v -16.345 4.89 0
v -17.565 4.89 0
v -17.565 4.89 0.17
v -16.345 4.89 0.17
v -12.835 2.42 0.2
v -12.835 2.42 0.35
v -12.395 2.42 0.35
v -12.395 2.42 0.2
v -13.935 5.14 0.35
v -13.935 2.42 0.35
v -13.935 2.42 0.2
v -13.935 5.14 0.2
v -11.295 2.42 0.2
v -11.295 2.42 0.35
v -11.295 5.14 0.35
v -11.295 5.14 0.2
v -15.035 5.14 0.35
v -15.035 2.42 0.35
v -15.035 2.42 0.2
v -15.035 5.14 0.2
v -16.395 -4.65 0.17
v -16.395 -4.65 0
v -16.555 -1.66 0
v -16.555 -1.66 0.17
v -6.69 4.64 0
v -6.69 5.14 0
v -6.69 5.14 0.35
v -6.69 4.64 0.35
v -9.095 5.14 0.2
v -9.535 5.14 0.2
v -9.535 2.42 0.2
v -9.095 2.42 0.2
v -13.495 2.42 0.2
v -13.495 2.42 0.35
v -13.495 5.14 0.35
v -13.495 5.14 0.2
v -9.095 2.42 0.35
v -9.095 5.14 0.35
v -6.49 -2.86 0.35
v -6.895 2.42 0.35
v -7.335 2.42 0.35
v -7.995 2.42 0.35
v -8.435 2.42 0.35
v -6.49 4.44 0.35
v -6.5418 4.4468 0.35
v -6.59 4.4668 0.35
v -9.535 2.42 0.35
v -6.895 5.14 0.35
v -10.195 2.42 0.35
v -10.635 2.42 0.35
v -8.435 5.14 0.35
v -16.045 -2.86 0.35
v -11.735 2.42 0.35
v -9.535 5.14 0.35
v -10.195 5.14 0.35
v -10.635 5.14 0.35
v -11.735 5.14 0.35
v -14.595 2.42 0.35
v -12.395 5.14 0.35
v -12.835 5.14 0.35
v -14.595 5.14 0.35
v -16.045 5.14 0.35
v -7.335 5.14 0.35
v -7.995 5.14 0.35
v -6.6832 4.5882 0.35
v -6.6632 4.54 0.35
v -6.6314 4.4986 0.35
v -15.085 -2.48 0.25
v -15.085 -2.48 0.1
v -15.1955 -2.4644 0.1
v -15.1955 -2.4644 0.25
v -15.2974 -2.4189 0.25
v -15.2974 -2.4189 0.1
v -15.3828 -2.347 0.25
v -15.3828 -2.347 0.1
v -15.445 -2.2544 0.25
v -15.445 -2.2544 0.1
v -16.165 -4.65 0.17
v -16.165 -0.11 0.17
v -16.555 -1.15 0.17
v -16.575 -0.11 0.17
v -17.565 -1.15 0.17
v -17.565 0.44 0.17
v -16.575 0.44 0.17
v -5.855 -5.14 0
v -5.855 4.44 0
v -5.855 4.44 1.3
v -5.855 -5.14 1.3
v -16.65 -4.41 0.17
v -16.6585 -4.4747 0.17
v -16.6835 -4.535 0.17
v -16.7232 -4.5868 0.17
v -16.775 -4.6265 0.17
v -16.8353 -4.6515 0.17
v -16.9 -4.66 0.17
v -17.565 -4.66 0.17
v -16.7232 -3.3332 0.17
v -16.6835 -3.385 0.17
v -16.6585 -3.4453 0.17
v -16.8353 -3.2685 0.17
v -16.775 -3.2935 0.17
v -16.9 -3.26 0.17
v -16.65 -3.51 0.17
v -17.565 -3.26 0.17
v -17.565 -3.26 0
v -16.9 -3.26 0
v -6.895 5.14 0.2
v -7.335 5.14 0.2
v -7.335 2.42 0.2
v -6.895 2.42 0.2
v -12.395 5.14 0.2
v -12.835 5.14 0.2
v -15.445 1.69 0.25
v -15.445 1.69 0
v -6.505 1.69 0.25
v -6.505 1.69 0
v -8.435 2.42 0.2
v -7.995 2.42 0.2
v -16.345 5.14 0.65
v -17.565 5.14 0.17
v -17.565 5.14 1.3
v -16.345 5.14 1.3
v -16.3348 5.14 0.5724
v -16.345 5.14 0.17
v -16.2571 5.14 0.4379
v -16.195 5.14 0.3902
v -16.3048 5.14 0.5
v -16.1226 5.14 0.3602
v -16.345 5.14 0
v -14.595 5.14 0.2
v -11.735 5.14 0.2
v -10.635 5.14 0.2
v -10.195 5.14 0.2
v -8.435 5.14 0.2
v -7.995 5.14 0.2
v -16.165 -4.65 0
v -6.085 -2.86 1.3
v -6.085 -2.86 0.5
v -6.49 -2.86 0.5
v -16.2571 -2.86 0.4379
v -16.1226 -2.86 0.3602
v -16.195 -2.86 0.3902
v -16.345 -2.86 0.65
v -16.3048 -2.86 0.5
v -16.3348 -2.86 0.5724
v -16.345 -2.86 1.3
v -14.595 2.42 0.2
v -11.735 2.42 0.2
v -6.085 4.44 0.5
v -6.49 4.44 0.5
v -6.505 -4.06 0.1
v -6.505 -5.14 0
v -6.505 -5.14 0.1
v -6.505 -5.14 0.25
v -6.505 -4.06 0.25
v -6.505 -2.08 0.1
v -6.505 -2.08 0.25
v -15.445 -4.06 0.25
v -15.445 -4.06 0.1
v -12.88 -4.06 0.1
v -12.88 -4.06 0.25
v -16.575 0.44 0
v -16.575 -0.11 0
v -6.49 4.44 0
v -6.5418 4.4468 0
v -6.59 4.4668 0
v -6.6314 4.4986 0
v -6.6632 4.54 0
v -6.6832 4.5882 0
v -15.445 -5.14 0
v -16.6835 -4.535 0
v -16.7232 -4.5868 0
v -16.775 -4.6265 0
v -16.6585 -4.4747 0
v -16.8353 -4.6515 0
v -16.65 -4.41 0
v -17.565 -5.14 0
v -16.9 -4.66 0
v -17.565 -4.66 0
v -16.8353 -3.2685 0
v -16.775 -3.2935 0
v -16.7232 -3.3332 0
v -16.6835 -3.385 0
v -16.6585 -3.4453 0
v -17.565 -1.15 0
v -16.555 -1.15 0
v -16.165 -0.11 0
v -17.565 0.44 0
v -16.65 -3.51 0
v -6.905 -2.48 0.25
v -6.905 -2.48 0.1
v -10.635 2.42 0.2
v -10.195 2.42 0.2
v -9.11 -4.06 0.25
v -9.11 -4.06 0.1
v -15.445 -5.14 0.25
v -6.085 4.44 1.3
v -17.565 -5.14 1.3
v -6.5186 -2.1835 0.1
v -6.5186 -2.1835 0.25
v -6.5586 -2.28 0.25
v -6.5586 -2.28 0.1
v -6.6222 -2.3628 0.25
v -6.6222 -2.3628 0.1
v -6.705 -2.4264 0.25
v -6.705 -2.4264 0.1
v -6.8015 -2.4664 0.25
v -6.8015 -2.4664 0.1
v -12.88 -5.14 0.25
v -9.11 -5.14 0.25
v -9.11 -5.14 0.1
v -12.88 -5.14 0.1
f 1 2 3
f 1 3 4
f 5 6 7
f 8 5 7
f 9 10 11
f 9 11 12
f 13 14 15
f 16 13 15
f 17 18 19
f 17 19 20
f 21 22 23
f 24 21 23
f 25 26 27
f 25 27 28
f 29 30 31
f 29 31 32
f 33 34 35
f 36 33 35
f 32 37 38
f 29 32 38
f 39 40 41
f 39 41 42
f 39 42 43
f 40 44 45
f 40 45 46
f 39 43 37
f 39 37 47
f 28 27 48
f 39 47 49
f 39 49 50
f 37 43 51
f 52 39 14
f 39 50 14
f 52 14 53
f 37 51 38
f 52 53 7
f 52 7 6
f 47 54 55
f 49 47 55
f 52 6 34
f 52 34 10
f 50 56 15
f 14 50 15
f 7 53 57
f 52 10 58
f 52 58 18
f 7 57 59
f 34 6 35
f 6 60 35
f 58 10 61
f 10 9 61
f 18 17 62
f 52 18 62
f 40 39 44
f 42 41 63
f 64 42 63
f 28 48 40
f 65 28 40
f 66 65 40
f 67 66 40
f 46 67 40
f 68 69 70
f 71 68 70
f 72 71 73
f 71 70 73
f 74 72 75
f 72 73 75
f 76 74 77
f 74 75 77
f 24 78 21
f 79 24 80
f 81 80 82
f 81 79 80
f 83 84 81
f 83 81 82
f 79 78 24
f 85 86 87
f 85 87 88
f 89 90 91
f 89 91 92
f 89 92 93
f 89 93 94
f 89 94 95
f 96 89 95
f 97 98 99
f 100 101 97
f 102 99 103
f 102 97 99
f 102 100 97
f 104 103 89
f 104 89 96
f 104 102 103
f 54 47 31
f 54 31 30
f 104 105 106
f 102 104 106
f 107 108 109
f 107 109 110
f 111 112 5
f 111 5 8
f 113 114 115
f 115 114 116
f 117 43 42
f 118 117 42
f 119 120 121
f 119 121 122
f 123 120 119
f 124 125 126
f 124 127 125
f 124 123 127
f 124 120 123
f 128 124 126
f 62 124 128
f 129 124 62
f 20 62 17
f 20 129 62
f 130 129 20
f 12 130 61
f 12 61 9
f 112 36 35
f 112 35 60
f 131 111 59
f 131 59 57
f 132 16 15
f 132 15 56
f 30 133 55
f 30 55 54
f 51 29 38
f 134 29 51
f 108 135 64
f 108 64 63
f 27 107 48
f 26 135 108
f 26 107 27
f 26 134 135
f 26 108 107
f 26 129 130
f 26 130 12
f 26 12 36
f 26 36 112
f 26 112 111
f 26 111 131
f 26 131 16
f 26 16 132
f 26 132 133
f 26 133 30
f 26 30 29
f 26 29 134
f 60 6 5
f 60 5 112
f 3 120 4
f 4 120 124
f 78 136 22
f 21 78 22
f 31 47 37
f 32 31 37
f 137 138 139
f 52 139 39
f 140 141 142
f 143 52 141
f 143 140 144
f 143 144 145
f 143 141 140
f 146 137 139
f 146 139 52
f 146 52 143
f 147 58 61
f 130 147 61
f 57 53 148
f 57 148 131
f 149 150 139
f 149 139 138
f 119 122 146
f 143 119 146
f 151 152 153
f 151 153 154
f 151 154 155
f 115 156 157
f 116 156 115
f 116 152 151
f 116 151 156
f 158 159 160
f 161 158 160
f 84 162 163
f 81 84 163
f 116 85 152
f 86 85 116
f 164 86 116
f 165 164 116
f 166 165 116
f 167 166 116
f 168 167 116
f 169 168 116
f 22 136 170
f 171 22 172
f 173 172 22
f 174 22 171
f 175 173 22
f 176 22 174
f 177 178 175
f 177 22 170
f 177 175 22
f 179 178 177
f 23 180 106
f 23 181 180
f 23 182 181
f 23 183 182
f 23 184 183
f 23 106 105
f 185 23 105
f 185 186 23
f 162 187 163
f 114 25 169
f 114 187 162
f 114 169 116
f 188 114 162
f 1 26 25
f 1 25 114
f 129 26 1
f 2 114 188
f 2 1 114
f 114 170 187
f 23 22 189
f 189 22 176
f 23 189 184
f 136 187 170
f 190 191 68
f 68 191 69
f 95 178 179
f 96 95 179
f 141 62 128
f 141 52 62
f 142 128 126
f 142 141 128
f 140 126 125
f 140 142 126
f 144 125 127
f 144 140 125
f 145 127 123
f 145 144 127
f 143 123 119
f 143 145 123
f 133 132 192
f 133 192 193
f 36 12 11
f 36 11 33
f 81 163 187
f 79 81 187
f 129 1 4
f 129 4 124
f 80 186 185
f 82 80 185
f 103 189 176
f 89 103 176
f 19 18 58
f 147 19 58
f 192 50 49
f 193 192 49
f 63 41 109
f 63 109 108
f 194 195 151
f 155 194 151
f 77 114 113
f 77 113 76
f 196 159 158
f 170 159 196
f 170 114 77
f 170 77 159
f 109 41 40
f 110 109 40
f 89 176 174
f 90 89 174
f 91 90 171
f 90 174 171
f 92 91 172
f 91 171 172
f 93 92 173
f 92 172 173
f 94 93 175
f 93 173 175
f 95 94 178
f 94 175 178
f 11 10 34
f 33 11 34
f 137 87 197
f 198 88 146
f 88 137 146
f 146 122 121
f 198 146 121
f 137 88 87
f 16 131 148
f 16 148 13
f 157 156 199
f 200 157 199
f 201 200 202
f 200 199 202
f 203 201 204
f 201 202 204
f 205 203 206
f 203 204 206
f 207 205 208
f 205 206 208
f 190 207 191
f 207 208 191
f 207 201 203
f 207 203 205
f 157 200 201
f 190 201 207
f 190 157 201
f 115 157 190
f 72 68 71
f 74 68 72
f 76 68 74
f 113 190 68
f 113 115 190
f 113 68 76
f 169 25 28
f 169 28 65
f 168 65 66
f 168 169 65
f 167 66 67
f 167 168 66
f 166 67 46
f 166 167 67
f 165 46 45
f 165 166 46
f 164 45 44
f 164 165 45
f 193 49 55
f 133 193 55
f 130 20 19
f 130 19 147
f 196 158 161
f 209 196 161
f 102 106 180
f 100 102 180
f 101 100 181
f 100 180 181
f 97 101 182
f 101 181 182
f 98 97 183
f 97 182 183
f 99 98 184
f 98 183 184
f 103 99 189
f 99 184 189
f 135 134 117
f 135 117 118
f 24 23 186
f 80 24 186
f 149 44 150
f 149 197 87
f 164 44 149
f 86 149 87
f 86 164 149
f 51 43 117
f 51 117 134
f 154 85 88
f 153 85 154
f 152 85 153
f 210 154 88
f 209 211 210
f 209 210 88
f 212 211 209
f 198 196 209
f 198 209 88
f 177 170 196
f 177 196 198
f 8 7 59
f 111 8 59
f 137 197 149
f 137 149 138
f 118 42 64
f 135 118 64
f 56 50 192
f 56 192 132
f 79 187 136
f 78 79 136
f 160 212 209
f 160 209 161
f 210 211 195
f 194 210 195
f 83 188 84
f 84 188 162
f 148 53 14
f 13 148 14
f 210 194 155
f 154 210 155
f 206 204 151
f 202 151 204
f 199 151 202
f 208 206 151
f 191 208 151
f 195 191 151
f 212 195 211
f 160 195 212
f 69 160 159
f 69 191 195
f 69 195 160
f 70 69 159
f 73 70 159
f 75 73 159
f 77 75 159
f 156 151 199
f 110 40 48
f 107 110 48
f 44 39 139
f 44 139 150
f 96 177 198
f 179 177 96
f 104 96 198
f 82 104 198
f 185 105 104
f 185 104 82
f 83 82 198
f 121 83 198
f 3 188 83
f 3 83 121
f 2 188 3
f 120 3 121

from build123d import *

# Parameters (mm, degrees)
BOSS_EXTRUDE1_DEPTH = 1.3
SKETCH3_W           = 1.22
SKETCH3_H           = 0.25
CUT_EXTRUDE1_DEPTH  = 0.17
CUT_EXTRUDE2_DEPTH  = 0.17
CUT_EXTRUDE3_DEPTH  = 0.1
SKETCH6_W           = 2.565
SKETCH6_H           = 1.079999998
SKETCH6_W_2         = 2.605000011
SKETCH6_H_2         = 1.079999997
CUT_EXTRUDE4_DEPTH  = 0.15
CUT_EXTRUDE5_DEPTH  = 0.95
SKETCH8_W           = 0.405
SKETCH8_H           = 7.3
BOSS_EXTRUDE2_DEPTH = 0.15
FILLET1_R           = 0.3
SKETCH9_W           = 0.44
SKETCH9_H           = 2.72
CUT_EXTRUDE6_DEPTH  = 0.15
LPATTERN1_COUNT     = 8
LPATTERN1_PITCH     = 1.1


with BuildPart() as part:
    # Sketch2 → Boss-Extrude1 (new body)
    with BuildSketch(Plane.XY):
        with BuildLine():
            Line((5.855, 5.140000001), (4.635, 5.140000001))
            Line((4.635, 5.140000001), (-5.02, 5.140000001))
            Line((-5.02, 5.140000001), (-5.02, 4.640000001))
            ThreePointArc((-5.02, 4.640000001), (-5.078578644, 4.498578644), (-5.22, 4.440000001))
            Line((-5.22, 4.440000001), (-5.855, 4.440000001))
            Line((-5.855, 4.440000001), (-5.855, -5.139999999))
            Line((-5.855, -5.139999999), (-5.205000011, -5.139999999))
            Line((-5.205000011, -5.139999999), (-2.6, -5.139999999))
            Line((-2.6, -5.139999999), (1.17, -5.139999999))
            Line((1.17, -5.139999999), (3.735, -5.139999999))
            Line((3.735, -5.139999999), (5.855, -5.139999999))
            Line((5.855, -5.139999999), (5.855, -4.659999975))
            Line((5.855, -4.659999975), (5.855, -3.259999975))
            Line((5.855, -3.259999975), (5.855, -1.150000033))
            Line((5.855, -1.150000033), (5.855, 0.439999967))
            Line((5.855, 0.439999967), (5.855, 4.890000001))
            Line((5.855, 4.890000001), (5.855, 5.140000001))
        make_face()
    extrude(amount=BOSS_EXTRUDE1_DEPTH)

    # Sketch3 → Cut-Extrude1 (cut)
    with BuildSketch(Plane(origin=(0, 0, 0), x_dir=(-1, 0, 0), z_dir=(0, 0, -1))):
        with Locations((-5.245, 5.015000001)):
            Rectangle(SKETCH3_W, SKETCH3_H)
    extrude(amount=-CUT_EXTRUDE1_DEPTH, mode=Mode.SUBTRACT)

    # Sketch4 → Cut-Extrude2 (cut)
    with BuildSketch(Plane(origin=(0, 0, 0), x_dir=(-1, 0, 0), z_dir=(0, 0, -1))):
        with BuildLine():
            Line((-5.855, -3.259999975), (-5.190000002, -3.259999975))
            ThreePointArc((-5.190000002, -3.259999975), (-5.013223307, -3.333223279), (-4.940000002, -3.509999975))
            Line((-4.940000002, -3.509999975), (-4.940000002, -4.409999975))
            ThreePointArc((-4.940000002, -4.409999975), (-5.013223307, -4.58677667), (-5.190000002, -4.659999975))
            Line((-5.190000002, -4.659999975), (-5.855, -4.659999975))
            Line((-5.855, -4.659999975), (-5.855, -3.259999975))
        make_face()
        Polygon((-4.455, -4.649999999), (-4.685, -4.649999999), (-4.845000002, -1.660000037), (-4.845000002, -1.150000033), (-5.855, -1.150000033), (-5.855, 0.439999967), (-4.865000002, 0.439999967), (-4.865000002, -0.110000037), (-4.455, -0.110000037), align=None)
    extrude(amount=-CUT_EXTRUDE2_DEPTH, mode=Mode.SUBTRACT)

    # Sketch5 → Cut-Extrude3 (cut)
    with BuildSketch(Plane(origin=(0, 0, 0), x_dir=(-1, 0, 0), z_dir=(0, 0, -1))):
        Polygon((5.205000011, -5.139999999), (2.6, -5.139999999), (-1.17, -5.139999999), (-3.735, -5.139999999), (-3.735, -4.060000001), (-3.735, -2.254355959), (-3.735, 1.690000007), (5.205000011, 1.690000007), (5.205000011, -2.080000002), (5.205000011, -4.060000002), align=None)
    extrude(amount=-CUT_EXTRUDE3_DEPTH, mode=Mode.SUBTRACT)

    # Sketch6 → Cut-Extrude4 (cut)
    with BuildSketch(Plane(origin=(0, 0, 0.1), x_dir=(-1, 0, 0), z_dir=(0, 0, -1))):
        with Locations((-2.4525, -4.6)):
            Rectangle(SKETCH6_W, SKETCH6_H)
        with Locations((3.902500006, -4.600000001)):
            Rectangle(SKETCH6_W_2, SKETCH6_H_2)
        with BuildLine():
            Line((5.205000011, 1.690000007), (5.205000011, -2.080000002))
            ThreePointArc((5.205000011, -2.080000002), (5.087842724, -2.362842714), (4.805000011, -2.480000002))
            Line((4.805000011, -2.480000002), (-3.375, -2.480000002))
            ThreePointArc((-3.375, -2.480000002), (-3.587435422, -2.41892653), (-3.735, -2.254355959))
            Line((-3.735, -2.254355959), (-3.735, 1.690000007))
            Line((-3.735, 1.690000007), (5.205000011, 1.690000007))
        make_face()
    extrude(amount=-CUT_EXTRUDE4_DEPTH, mode=Mode.SUBTRACT)


with BuildPart() as body_2:
    # Mirror1: mirrored copy
    add(part.part.mirror(Plane(origin=(-5.855, 4.440000001, 1.3), x_dir=(0, 0, 1), z_dir=(1, 0, 0))))

    # Sketch7 → Cut-Extrude5 (cut)
    with BuildSketch(Plane.XY.offset(1.3)):
        Polygon((-6.085, -2.859999999), (-16.345, -2.859999999), (-16.345, 5.140000001), (-16.345, 5.61631281), (-6.085, 5.61631281), align=None)
    extrude(amount=-CUT_EXTRUDE5_DEPTH, mode=Mode.SUBTRACT)

    # Sketch8 → Boss-Extrude2 (add)
    with BuildSketch(Plane.XY.offset(0.35)):
        with Locations((-6.2875, 0.790000001)):
            Rectangle(SKETCH8_W, SKETCH8_H)
    extrude(amount=BOSS_EXTRUDE2_DEPTH)

    # Fillet1
    fillet1_edges = [body_2.edges().sort_by_distance(p)[0] for p in [
        (-16.345, 1.140000001, 0.35),
    ]]
    fillet(fillet1_edges, radius=FILLET1_R)

    # Sketch9 → Cut-Extrude6 (cut)
    with BuildSketch(Plane.XY.offset(0.35)):
        with Locations((-7.115, 3.780000001)):
            Rectangle(SKETCH9_W, SKETCH9_H)
    cut_extrude6 = extrude(amount=-CUT_EXTRUDE6_DEPTH, mode=Mode.SUBTRACT)

    # LPattern1: Cut-Extrude6 ×8
    with Locations(*[(-i * LPATTERN1_PITCH, 0, 0) for i in range(1, LPATTERN1_COUNT)]):
        add(cut_extrude6, mode=Mode.SUBTRACT)


solid = body_2.part
